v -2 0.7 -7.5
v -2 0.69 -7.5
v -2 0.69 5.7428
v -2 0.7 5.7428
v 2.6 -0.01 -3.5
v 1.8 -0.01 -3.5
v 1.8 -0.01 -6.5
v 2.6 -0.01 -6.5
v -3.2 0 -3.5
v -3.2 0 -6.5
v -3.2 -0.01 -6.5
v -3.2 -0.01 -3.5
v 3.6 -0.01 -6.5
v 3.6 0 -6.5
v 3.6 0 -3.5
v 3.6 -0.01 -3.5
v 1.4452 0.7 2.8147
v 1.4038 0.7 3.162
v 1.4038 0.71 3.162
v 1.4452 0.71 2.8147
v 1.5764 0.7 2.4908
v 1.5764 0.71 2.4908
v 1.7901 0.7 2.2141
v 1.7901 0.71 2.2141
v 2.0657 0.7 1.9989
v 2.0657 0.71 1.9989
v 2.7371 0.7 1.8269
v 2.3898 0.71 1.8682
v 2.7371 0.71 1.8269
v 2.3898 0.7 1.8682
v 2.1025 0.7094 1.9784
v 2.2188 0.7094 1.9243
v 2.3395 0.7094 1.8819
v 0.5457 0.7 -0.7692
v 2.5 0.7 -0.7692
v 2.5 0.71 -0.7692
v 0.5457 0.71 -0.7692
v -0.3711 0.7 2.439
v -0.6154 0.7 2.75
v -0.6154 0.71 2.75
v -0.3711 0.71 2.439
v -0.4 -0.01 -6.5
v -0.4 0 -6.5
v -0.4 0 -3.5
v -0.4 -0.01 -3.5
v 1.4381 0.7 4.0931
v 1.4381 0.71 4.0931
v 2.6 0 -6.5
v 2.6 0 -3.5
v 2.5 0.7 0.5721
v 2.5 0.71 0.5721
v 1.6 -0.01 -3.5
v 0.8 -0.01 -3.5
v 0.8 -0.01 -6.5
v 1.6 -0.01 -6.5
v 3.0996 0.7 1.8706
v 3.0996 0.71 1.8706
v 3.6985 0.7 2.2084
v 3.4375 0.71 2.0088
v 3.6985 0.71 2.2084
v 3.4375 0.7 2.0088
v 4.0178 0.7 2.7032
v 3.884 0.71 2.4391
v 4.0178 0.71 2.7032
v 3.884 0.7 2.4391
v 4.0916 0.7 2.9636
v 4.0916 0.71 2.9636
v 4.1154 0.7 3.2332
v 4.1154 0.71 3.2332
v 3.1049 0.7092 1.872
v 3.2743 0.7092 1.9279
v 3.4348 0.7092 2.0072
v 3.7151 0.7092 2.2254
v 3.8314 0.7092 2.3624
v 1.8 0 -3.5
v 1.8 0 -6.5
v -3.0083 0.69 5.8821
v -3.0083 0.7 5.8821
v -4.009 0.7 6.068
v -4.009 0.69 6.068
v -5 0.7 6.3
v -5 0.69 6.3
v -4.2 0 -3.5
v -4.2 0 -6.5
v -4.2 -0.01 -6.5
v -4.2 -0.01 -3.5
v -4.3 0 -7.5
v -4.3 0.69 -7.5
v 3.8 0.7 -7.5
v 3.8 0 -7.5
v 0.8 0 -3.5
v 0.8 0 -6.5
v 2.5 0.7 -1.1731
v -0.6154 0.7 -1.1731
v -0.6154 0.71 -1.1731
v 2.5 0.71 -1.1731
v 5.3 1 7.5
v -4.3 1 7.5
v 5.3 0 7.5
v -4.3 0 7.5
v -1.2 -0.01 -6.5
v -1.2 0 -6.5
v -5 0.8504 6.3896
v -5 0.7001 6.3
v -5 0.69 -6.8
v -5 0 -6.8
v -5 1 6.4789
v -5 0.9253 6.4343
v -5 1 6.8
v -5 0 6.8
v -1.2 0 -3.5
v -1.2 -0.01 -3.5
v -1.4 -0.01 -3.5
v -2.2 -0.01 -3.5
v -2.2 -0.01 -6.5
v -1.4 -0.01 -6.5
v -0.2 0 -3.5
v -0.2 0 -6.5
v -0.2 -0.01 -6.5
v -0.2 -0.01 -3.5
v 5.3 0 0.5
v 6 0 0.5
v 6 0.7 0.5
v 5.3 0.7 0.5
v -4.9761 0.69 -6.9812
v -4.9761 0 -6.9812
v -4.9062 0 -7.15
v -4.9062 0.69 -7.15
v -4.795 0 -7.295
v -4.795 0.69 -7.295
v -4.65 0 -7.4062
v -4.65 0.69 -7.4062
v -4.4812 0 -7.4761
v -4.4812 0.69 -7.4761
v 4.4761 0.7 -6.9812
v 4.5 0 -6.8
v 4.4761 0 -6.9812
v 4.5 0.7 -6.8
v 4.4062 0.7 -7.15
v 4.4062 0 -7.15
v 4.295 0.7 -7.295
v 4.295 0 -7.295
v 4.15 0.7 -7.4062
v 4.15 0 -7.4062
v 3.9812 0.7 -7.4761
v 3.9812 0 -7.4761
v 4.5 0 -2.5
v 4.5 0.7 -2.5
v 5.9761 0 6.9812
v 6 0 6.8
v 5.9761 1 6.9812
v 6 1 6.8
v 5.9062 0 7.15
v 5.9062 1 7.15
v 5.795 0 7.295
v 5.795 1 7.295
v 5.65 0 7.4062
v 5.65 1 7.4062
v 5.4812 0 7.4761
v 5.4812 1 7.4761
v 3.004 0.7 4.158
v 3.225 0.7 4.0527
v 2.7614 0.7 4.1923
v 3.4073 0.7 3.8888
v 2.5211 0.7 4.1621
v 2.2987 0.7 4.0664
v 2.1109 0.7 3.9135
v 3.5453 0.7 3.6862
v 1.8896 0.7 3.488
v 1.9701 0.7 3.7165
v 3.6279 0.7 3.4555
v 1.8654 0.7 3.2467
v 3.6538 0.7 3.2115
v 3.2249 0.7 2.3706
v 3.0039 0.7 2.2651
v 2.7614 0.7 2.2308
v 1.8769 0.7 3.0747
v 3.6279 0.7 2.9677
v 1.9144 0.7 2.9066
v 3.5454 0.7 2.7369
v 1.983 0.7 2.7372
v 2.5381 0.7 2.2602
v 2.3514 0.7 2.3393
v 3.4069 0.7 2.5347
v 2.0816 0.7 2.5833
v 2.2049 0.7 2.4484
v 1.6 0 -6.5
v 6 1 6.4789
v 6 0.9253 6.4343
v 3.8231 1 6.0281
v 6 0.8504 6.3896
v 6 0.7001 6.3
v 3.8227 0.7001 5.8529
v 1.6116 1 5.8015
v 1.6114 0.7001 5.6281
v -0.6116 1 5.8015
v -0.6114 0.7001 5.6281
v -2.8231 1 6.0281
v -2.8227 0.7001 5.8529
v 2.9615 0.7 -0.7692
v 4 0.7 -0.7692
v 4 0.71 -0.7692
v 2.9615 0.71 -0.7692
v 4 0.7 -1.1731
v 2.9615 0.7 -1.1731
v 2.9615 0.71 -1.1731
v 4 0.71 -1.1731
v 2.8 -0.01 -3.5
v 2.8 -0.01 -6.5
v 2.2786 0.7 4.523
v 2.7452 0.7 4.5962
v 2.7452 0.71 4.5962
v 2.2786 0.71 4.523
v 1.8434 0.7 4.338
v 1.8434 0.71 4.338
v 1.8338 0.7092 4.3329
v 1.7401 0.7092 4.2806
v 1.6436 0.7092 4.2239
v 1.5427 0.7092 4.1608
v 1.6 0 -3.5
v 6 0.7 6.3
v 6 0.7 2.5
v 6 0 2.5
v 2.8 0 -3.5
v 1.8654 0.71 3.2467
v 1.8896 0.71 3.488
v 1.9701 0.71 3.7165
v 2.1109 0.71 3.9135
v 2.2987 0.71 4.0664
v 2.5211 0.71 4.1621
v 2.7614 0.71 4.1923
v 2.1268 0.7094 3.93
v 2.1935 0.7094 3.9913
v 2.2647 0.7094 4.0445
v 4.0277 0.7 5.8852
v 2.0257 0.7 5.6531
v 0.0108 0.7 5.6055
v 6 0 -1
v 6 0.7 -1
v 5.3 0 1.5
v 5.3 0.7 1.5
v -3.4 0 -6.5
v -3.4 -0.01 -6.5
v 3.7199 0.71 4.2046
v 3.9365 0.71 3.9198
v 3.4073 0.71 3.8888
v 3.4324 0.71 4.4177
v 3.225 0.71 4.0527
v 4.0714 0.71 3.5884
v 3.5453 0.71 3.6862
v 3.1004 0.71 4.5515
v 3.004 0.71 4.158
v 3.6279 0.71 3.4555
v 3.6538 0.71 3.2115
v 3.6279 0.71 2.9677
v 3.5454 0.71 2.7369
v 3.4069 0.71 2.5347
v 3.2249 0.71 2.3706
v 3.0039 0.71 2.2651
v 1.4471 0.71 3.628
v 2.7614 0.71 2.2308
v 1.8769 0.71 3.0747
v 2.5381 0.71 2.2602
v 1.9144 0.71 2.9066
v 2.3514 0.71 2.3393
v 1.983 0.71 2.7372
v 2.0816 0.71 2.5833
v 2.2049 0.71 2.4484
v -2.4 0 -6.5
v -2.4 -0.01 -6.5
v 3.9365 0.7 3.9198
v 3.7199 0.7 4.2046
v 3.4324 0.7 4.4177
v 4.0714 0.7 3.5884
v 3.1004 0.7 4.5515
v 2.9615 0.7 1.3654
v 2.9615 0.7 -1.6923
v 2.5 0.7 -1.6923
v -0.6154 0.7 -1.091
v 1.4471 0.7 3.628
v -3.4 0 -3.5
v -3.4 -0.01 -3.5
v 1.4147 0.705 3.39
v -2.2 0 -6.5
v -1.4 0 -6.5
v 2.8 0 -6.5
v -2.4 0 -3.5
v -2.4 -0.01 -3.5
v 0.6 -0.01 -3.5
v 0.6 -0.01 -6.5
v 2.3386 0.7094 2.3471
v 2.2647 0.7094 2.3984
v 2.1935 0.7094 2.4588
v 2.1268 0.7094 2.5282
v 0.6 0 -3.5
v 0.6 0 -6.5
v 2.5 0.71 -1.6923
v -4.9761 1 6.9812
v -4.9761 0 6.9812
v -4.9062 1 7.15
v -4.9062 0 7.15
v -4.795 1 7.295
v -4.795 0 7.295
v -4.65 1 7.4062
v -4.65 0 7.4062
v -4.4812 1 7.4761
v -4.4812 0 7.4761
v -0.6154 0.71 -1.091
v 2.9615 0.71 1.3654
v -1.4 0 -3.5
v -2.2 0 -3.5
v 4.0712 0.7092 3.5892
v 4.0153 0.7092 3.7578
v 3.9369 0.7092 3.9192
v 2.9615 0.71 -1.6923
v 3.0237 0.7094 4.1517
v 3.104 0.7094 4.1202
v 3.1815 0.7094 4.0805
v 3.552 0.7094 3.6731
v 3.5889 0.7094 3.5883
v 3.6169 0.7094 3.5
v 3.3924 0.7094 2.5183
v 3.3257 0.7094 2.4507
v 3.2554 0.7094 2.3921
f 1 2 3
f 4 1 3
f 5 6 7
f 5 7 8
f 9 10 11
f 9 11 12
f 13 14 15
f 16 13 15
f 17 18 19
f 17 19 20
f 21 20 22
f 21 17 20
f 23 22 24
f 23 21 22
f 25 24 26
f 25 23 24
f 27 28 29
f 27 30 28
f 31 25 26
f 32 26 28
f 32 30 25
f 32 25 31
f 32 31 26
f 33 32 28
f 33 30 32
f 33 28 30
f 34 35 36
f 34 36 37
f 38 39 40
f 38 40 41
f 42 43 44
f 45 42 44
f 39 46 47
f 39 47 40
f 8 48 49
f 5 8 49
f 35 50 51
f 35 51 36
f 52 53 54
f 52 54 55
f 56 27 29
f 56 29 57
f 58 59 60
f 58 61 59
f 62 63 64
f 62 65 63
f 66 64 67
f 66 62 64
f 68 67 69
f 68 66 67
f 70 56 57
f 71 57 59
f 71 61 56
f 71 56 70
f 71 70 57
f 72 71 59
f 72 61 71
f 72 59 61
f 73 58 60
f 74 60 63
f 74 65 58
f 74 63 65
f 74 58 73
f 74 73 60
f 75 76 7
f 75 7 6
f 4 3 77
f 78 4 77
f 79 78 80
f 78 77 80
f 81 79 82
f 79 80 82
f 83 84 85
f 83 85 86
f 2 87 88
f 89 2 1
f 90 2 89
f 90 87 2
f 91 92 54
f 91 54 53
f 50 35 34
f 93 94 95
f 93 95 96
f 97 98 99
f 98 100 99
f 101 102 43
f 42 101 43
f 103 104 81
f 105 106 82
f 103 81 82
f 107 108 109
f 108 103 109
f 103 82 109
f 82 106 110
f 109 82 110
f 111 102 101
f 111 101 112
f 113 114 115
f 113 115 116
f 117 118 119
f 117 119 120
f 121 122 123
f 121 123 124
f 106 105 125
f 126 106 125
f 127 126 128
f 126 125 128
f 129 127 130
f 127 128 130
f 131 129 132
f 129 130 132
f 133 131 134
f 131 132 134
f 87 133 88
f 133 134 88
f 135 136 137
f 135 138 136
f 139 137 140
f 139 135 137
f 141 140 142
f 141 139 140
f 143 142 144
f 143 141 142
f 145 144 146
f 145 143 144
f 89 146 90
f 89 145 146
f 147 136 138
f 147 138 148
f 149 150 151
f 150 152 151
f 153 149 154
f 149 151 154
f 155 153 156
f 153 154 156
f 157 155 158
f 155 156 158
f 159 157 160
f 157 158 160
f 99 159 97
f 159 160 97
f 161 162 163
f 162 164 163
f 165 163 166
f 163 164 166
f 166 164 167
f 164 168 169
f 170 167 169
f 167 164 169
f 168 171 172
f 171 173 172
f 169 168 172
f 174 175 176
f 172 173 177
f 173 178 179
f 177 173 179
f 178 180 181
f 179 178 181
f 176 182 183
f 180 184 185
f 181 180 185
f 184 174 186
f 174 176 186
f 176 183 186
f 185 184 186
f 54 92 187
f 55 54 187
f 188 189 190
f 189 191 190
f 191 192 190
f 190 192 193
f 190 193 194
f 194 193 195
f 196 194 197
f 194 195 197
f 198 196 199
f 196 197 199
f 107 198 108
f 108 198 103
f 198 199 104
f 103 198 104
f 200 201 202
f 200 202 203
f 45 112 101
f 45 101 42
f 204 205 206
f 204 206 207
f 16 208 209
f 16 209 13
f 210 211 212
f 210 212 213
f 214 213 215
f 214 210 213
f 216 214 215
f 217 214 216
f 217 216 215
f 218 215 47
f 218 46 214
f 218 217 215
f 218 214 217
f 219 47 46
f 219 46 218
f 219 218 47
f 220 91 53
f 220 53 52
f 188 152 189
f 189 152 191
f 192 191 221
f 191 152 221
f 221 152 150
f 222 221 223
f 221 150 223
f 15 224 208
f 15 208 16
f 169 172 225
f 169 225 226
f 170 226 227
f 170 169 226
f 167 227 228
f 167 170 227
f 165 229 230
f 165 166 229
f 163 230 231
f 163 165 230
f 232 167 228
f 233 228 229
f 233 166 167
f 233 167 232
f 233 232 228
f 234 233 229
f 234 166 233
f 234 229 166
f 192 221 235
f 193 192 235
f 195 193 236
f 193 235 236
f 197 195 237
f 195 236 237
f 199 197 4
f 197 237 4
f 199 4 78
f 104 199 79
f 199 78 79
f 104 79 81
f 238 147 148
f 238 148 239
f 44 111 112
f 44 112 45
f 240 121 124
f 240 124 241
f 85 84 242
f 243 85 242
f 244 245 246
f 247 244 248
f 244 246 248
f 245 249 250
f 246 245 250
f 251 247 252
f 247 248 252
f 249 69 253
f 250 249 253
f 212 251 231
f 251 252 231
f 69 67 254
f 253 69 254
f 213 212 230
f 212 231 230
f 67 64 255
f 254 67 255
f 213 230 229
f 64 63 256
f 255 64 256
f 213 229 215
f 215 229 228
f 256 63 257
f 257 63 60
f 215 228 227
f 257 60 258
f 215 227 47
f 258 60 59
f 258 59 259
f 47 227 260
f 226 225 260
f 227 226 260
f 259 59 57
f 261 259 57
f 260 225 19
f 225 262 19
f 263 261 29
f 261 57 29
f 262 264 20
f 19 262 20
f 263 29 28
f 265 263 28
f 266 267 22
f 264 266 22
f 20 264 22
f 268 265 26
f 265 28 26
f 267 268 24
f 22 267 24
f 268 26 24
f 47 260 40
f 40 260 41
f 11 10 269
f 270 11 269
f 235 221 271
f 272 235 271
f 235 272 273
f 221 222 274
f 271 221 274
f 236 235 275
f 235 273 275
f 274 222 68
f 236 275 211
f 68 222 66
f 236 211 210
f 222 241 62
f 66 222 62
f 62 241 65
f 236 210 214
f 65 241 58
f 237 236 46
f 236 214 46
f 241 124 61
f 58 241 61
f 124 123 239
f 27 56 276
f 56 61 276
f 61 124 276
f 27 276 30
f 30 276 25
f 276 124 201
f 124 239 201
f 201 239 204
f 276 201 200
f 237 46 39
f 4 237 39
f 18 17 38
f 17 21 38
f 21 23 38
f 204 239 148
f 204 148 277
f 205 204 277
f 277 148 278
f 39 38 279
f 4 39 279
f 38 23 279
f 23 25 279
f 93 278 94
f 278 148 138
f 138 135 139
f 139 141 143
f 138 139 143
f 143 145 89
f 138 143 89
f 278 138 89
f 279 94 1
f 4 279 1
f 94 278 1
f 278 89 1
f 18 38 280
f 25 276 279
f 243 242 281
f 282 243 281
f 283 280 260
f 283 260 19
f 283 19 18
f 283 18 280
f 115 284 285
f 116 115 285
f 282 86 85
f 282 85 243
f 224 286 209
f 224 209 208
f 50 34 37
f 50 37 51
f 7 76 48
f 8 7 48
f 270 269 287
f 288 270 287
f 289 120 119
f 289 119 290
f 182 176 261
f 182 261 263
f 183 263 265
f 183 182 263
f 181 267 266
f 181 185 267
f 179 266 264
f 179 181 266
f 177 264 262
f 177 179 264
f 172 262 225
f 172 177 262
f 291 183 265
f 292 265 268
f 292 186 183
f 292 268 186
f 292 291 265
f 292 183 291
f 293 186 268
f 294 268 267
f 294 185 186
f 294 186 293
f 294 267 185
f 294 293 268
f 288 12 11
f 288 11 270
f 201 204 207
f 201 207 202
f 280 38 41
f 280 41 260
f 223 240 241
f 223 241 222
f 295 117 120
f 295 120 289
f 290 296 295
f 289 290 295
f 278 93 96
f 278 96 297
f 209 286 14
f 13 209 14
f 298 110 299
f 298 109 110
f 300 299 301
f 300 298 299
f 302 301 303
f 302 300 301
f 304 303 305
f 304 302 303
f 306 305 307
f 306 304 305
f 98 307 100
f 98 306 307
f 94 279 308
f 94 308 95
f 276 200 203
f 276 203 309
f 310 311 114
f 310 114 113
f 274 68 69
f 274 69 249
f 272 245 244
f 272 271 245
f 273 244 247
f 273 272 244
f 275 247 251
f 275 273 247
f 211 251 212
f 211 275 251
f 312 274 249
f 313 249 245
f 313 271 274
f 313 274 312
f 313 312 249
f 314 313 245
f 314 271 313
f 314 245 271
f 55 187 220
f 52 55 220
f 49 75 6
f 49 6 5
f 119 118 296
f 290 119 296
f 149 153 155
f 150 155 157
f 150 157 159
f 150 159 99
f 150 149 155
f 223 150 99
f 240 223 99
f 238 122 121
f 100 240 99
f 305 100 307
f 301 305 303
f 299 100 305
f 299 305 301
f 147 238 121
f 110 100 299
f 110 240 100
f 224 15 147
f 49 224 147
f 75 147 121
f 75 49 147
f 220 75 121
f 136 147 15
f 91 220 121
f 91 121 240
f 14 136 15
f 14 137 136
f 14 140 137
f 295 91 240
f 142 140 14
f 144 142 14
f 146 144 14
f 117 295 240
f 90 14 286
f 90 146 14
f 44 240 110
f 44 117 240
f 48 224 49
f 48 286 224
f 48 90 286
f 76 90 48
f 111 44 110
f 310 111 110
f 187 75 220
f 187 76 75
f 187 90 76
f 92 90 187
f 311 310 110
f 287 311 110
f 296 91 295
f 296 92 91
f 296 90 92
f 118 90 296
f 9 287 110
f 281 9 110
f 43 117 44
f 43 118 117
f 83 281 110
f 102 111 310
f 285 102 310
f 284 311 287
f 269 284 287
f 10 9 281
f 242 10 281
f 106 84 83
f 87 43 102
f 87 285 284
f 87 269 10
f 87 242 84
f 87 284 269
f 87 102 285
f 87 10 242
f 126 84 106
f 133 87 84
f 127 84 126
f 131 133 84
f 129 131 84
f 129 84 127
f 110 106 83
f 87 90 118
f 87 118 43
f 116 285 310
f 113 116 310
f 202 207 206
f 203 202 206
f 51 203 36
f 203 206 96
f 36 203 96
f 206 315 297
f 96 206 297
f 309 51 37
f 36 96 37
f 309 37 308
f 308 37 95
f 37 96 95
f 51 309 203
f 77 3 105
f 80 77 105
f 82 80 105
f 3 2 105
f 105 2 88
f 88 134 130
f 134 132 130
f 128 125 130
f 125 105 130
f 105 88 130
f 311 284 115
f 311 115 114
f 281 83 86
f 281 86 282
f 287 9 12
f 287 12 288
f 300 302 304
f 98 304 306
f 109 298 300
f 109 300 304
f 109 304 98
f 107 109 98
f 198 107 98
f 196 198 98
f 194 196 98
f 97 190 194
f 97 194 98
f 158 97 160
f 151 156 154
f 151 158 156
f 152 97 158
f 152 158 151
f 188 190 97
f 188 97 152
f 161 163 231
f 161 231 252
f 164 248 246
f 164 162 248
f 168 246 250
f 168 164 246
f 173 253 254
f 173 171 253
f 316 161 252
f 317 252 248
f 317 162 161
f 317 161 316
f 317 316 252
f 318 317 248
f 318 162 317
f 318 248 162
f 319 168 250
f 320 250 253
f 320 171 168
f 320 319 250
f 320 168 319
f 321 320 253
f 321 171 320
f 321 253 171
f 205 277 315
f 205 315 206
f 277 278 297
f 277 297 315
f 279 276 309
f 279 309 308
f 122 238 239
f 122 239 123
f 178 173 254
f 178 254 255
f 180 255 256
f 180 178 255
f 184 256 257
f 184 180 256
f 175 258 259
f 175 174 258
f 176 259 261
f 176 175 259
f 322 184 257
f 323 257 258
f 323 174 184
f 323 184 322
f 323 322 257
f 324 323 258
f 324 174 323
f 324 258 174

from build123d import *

# Parameters (mm, degrees)
BOSS_EXTRUDE1_DEPTH = 0.7
BOSS_EXTRUDE2_DEPTH = 0.3
FILLET1_R           = 0.7
CHAMFER1_SIZE2      = 0.3
CHAMFER1_SIZE       = 0.173205081
SKETCH3_W           = 0.8
SKETCH3_H           = 3
BOSS_EXTRUDE3_DEPTH = 0.01
LPATTERN1_COUNT     = 8
LPATTERN1_PITCH     = 1
CUT_EXTRUDE1_START  = -0.01
CUT_EXTRUDE1_DEPTH  = 0.01
BOSS_EXTRUDE4_DEPTH = 0.01


with BuildPart() as part:
    # Sketch1 → Boss-Extrude1 (new body)
    with BuildSketch(Plane(origin=(0, 0, 0), x_dir=(1, 0, 0), z_dir=(0, 1, 0))):
        Polygon((6, -2.5), (6, -7.5), (-5, -7.5), (-5, 7.5), (4.5, 7.5), (4.5, 2.5), (6, 1), (6, -0.5), (5.3, -0.5), (5.3, -1.5), align=None)
    extrude(amount=BOSS_EXTRUDE1_DEPTH)

    # Sketch2 → Boss-Extrude2 (add)
    with BuildSketch(Plane(origin=(0, 0.7, 0), x_dir=(1, 0, 0), z_dir=(0, 1, 0))):
        with BuildLine():
            Line((-5, -6.3), (-5, -7.5))
            Line((-5, -7.5), (6, -7.5))
            Line((6, -7.5), (6, -6.3))
            ThreePointArc((6, -6.3), (0.5, -5.6), (-5, -6.3))
        make_face()
    extrude(amount=BOSS_EXTRUDE2_DEPTH)

    # Fillet1
    fillet1_edges = [part.edges().sort_by_distance(p)[0] for p in [
        (6, 0.5, 7.5),
        (-5, 0.5, 7.5),
        (-5, 0.35, -7.5),
        (4.5, 0.35, -7.5),
    ]]
    fillet(fillet1_edges, radius=FILLET1_R)

    # Chamfer1
    chamfer1_edges = [part.edges().sort_by_distance(p)[0] for p in [
        (0.5, 1, 5.6),
    ]]
    chamfer1_side = [part.faces().sort_by_distance(p)[0] for p in [
        (0.5, 1, 5.603464102),
    ]]
    chamfer(chamfer1_edges, length=CHAMFER1_SIZE - 0.0001, length2=CHAMFER1_SIZE2 - 0.0001, reference=chamfer1_side[0])  # a hair under: the kernel refuses the full size

    # Sketch3 → Boss-Extrude3 (add)
    with BuildSketch(Plane.XZ):
        with Locations((-3.8, -5)):
            Rectangle(SKETCH3_W, SKETCH3_H)
    boss_extrude3 = extrude(amount=BOSS_EXTRUDE3_DEPTH)

    # LPattern1: Boss-Extrude3 ×8
    with Locations(*[(i * LPATTERN1_PITCH, 0, 0) for i in range(1, LPATTERN1_COUNT)]):
        add(boss_extrude3)

    # Sketch5 → Cut-Extrude1 (cut)
    with BuildSketch(Plane(origin=(0, 0.7, 0), x_dir=(1, 0, 0), z_dir=(0, 1, 0)).offset(CUT_EXTRUDE1_START)):
        with BuildLine():
            Line((-5, -6.3), (-5, 7.687555769))
            Line((-5, 7.687555769), (-2, 7.687555769))
            Line((-2, 7.687555769), (-2, -5.742786977))
            ThreePointArc((-2, -5.742786977), (-3.509690959, -5.969217972), (-5, -6.3))
        make_face()
    extrude(amount=CUT_EXTRUDE1_DEPTH, mode=Mode.SUBTRACT)

    # Sketch4 → Boss-Extrude4 (add)
    # profile 1 of 2: a face of its own
    with BuildSketch(Plane(origin=(0, 0.7, 0), x_dir=(1, 0, 0), z_dir=(0, 1, 0))):
        with BuildLine():
            Line((-0.615384615, -2.75), (-0.37109375, -2.439002404))
            Line((-0.37109375, -2.439002404), (1.447115385, -3.628004808))
            add(Edge.make_bspline(
                [(1.447115385, -3.628004808), (1.434497564, -3.548843023), (1.409885078, -3.394429011), (1.405824862, -3.238129999), (1.403846154, -3.161959135)],
                knots=[0, 0, 0, 0, 1.025318673, 2, 2, 2, 2], degree=3))
            add(Edge.make_bspline(
                [(1.403846154, -3.161959135), (1.40507544, -3.116223068), (1.407495254, -3.026192981), (1.426117348, -2.894012808), (1.455463919, -2.766998457), (1.498242541, -2.645676402), (1.552888396, -2.529611073), (1.618381342, -2.418136818), (1.698102499, -2.313347546), (1.787159106, -2.21389978), (1.885789037, -2.12359384), (1.990470293, -2.043703676), (2.101194596, -1.97622976), (2.217937047, -1.922472915), (2.339783801, -1.879511677), (2.46721007, -1.848928505), (2.600430921, -1.830645424), (2.691048417, -1.828176974), (2.737079327, -1.826923077)],
                knots=[0, 0, 0, 0, 1.043709831, 2.054511743, 3.041122595, 4.01515914, 4.98481438, 5.965901842, 6.960491961, 7.985277438, 9.0096037, 10.00832444, 10.987059228, 11.962929573, 12.936966118, 13.931840027, 14.949438142, 16, 16, 16, 16], degree=3))
            add(Edge.make_bspline(
                [(2.737079327, -1.826923077), (2.800055589, -1.828748336), (2.923977968, -1.832340015), (3.104428638, -1.868279847), (3.276237792, -1.923709962), (3.436432503, -2.004206562), (3.586122296, -2.102297304), (3.718320331, -2.223387248), (3.836219906, -2.361468581), (3.934767808, -2.517682681), (4.015260324, -2.685776222), (4.073072014, -2.862372856), (4.108665247, -3.045750298), (4.113127423, -3.170213408), (4.115384615, -3.233173077)],
                knots=[0, 0, 0, 0, 1.031403119, 2.029557249, 3.004870281, 3.983165322, 4.960181699, 5.929903783, 6.912123683, 7.928973898, 8.949315281, 9.960468141, 10.968302741, 12, 12, 12, 12], degree=3))
            add(Edge.make_bspline(
                [(4.115384615, -3.233173077), (4.113425363, -3.293728526), (4.109544427, -3.413678269), (4.074792271, -3.590083158), (4.018865585, -3.759886916), (3.940200981, -3.920909877), (3.842516001, -4.070320901), (3.725735923, -4.205059604), (3.589698509, -4.321514883), (3.437379658, -4.419302266), (3.273930698, -4.497189895), (3.103206109, -4.555053217), (2.925922629, -4.589030783), (2.805730368, -4.59376788), (2.745192308, -4.596153846)],
                knots=[0, 0, 0, 0, 1.012172929, 2.004937354, 2.995255351, 3.995689452, 4.993936421, 5.973737378, 6.968231049, 7.979117505, 8.993136101, 9.989812463, 10.987515067, 12, 12, 12, 12], degree=3))
            add(Edge.make_bspline(
                [(2.745192308, -4.596153846), (2.698849272, -4.594634845), (2.604225648, -4.591533336), (2.460914755, -4.569877549), (2.31427765, -4.535079955), (2.189879401, -4.496109639), (2.08797173, -4.454933854), (2.005810099, -4.420666303), (1.921260148, -4.378014023), (1.831422616, -4.332533961), (1.738612774, -4.280132273), (1.641279485, -4.223155009), (1.54097072, -4.160026886), (1.472899612, -4.115772392), (1.438100962, -4.093149038)],
                knots=[0, 0, 0, 0, 1.173818275, 2.396712641, 3.66331629, 4.989737886, 5.693666774, 6.447286557, 7.243889047, 8.091586357, 8.998013824, 9.943181721, 10.948533338, 12, 12, 12, 12], degree=3))
            Line((1.438100962, -4.093149038), (-0.615384615, -2.75))
        make_face()
        with BuildLine():
            add(Edge.make_bspline(
                [(1.865384615, -3.246694712), (1.8663753, -3.28097808), (1.868310394, -3.347943459), (1.879792233, -3.446134849), (1.900690488, -3.539368105), (1.929667741, -3.627670289), (1.965393302, -3.711586134), (2.011232334, -3.789452661), (2.064624344, -3.862872186), (2.125472743, -3.930671657), (2.192048636, -3.992157699), (2.263368863, -4.045103926), (2.337700822, -4.090775827), (2.415669188, -4.12790953), (2.497243218, -4.156825359), (2.582047978, -4.177741676), (2.670652083, -4.189382215), (2.73073673, -4.191318798), (2.761418269, -4.192307692)],
                knots=[0, 0, 0, 0, 1.129656352, 2.206547016, 3.251334079, 4.271920891, 5.265058649, 6.249872215, 7.241923875, 8.251504132, 9.246416584, 10.222533834, 11.173322129, 12.116503788, 13.062124155, 14.020151864, 14.989013135, 16, 16, 16, 16], degree=3))
            add(Edge.make_bspline(
                [(2.761418269, -4.192307692), (2.791820074, -4.191473852), (2.851730559, -4.189830668), (2.939673033, -4.175840608), (3.024108675, -4.153478957), (3.10472016, -4.121176044), (3.183055016, -4.08192157), (3.256667917, -4.031535431), (3.327943341, -3.973706783), (3.393569596, -3.906186554), (3.454494335, -3.833170458), (3.50796717, -3.755324944), (3.553183997, -3.673822107), (3.590651134, -3.588896682), (3.618232291, -3.499498881), (3.639347167, -3.4070803), (3.650890957, -3.3103844), (3.652848159, -3.244919557), (3.653846154, -3.211538462)],
                knots=[0, 0, 0, 0, 0.989367052, 1.949669134, 2.891858276, 3.827522767, 4.772653562, 5.738670152, 6.725809442, 7.756636004, 8.798867547, 9.819240912, 10.826537776, 11.829883227, 12.835515726, 13.868058748, 14.912904531, 16, 16, 16, 16], degree=3))
            add(Edge.make_bspline(
                [(3.653846154, -3.211538462), (3.652848082, -3.178157421), (3.650890727, -3.112692685), (3.639348041, -3.015996006), (3.618229086, -2.9235803), (3.590662748, -2.834172058), (3.553140653, -2.749285358), (3.508250138, -2.667853764), (3.454166469, -2.590744499), (3.393674202, -2.517680886), (3.32756834, -2.45044126), (3.257310144, -2.391252543), (3.182466, -2.342440577), (3.105028171, -2.301629691), (3.024060526, -2.269684452), (2.939686174, -2.247212711), (2.85172713, -2.233252413), (2.79181892, -2.231605144), (2.761418269, -2.230769231)],
                knots=[0, 0, 0, 0, 1.087281468, 2.132306021, 3.165025708, 4.170830268, 5.174347389, 6.181816599, 7.194310624, 8.23672049, 9.267723423, 10.261267456, 11.222032883, 12.171822355, 13.107646935, 14.049997283, 15.01046367, 16, 16, 16, 16], degree=3))
            add(Edge.make_bspline(
                [(2.761418269, -2.230769231), (2.730696704, -2.23147675), (2.670400261, -2.232865381), (2.582087612, -2.248571602), (2.496812336, -2.270354649), (2.415110442, -2.303247134), (2.337304096, -2.345979773), (2.263001203, -2.398030102), (2.191628428, -2.458242489), (2.125342463, -2.527800045), (2.064690312, -2.603502471), (2.011305764, -2.684058006), (1.965736495, -2.767997769), (1.929778734, -2.856504174), (1.900810753, -2.948386374), (1.879866743, -3.044278828), (1.868340324, -3.144249739), (1.866382401, -3.212111437), (1.865384615, -3.246694712)],
                knots=[0, 0, 0, 0, 0.978259475, 1.920005202, 2.851759169, 3.7803069, 4.719124913, 5.675758531, 6.668034766, 7.691045932, 8.733780038, 9.756656648, 10.768121246, 11.773215211, 12.79725739, 13.836288844, 14.897342417, 16, 16, 16, 16], degree=3))
        make_face(mode=Mode.SUBTRACT)
    # profile 2 of 2: a face of its own
    with BuildSketch(Plane(origin=(0, 0.7, 0), x_dir=(1, 0, 0), z_dir=(0, 1, 0))):
        Polygon((-0.615384615, 1.091045673), (-0.615384615, 1.173076923), (2.5, 1.173076923), (2.5, 1.692307692), (2.961538462, 1.692307692), (2.961538462, 1.173076923), (4, 1.173076923), (4, 0.769230769), (2.961538462, 0.769230769), (2.961538462, -1.365384615), align=None)
        Polygon((2.5, 0.769230769), (0.545673077, 0.769230769), (2.5, -0.572115385), align=None, mode=Mode.SUBTRACT)
    extrude(amount=BOSS_EXTRUDE4_DEPTH)


solid = part.part
